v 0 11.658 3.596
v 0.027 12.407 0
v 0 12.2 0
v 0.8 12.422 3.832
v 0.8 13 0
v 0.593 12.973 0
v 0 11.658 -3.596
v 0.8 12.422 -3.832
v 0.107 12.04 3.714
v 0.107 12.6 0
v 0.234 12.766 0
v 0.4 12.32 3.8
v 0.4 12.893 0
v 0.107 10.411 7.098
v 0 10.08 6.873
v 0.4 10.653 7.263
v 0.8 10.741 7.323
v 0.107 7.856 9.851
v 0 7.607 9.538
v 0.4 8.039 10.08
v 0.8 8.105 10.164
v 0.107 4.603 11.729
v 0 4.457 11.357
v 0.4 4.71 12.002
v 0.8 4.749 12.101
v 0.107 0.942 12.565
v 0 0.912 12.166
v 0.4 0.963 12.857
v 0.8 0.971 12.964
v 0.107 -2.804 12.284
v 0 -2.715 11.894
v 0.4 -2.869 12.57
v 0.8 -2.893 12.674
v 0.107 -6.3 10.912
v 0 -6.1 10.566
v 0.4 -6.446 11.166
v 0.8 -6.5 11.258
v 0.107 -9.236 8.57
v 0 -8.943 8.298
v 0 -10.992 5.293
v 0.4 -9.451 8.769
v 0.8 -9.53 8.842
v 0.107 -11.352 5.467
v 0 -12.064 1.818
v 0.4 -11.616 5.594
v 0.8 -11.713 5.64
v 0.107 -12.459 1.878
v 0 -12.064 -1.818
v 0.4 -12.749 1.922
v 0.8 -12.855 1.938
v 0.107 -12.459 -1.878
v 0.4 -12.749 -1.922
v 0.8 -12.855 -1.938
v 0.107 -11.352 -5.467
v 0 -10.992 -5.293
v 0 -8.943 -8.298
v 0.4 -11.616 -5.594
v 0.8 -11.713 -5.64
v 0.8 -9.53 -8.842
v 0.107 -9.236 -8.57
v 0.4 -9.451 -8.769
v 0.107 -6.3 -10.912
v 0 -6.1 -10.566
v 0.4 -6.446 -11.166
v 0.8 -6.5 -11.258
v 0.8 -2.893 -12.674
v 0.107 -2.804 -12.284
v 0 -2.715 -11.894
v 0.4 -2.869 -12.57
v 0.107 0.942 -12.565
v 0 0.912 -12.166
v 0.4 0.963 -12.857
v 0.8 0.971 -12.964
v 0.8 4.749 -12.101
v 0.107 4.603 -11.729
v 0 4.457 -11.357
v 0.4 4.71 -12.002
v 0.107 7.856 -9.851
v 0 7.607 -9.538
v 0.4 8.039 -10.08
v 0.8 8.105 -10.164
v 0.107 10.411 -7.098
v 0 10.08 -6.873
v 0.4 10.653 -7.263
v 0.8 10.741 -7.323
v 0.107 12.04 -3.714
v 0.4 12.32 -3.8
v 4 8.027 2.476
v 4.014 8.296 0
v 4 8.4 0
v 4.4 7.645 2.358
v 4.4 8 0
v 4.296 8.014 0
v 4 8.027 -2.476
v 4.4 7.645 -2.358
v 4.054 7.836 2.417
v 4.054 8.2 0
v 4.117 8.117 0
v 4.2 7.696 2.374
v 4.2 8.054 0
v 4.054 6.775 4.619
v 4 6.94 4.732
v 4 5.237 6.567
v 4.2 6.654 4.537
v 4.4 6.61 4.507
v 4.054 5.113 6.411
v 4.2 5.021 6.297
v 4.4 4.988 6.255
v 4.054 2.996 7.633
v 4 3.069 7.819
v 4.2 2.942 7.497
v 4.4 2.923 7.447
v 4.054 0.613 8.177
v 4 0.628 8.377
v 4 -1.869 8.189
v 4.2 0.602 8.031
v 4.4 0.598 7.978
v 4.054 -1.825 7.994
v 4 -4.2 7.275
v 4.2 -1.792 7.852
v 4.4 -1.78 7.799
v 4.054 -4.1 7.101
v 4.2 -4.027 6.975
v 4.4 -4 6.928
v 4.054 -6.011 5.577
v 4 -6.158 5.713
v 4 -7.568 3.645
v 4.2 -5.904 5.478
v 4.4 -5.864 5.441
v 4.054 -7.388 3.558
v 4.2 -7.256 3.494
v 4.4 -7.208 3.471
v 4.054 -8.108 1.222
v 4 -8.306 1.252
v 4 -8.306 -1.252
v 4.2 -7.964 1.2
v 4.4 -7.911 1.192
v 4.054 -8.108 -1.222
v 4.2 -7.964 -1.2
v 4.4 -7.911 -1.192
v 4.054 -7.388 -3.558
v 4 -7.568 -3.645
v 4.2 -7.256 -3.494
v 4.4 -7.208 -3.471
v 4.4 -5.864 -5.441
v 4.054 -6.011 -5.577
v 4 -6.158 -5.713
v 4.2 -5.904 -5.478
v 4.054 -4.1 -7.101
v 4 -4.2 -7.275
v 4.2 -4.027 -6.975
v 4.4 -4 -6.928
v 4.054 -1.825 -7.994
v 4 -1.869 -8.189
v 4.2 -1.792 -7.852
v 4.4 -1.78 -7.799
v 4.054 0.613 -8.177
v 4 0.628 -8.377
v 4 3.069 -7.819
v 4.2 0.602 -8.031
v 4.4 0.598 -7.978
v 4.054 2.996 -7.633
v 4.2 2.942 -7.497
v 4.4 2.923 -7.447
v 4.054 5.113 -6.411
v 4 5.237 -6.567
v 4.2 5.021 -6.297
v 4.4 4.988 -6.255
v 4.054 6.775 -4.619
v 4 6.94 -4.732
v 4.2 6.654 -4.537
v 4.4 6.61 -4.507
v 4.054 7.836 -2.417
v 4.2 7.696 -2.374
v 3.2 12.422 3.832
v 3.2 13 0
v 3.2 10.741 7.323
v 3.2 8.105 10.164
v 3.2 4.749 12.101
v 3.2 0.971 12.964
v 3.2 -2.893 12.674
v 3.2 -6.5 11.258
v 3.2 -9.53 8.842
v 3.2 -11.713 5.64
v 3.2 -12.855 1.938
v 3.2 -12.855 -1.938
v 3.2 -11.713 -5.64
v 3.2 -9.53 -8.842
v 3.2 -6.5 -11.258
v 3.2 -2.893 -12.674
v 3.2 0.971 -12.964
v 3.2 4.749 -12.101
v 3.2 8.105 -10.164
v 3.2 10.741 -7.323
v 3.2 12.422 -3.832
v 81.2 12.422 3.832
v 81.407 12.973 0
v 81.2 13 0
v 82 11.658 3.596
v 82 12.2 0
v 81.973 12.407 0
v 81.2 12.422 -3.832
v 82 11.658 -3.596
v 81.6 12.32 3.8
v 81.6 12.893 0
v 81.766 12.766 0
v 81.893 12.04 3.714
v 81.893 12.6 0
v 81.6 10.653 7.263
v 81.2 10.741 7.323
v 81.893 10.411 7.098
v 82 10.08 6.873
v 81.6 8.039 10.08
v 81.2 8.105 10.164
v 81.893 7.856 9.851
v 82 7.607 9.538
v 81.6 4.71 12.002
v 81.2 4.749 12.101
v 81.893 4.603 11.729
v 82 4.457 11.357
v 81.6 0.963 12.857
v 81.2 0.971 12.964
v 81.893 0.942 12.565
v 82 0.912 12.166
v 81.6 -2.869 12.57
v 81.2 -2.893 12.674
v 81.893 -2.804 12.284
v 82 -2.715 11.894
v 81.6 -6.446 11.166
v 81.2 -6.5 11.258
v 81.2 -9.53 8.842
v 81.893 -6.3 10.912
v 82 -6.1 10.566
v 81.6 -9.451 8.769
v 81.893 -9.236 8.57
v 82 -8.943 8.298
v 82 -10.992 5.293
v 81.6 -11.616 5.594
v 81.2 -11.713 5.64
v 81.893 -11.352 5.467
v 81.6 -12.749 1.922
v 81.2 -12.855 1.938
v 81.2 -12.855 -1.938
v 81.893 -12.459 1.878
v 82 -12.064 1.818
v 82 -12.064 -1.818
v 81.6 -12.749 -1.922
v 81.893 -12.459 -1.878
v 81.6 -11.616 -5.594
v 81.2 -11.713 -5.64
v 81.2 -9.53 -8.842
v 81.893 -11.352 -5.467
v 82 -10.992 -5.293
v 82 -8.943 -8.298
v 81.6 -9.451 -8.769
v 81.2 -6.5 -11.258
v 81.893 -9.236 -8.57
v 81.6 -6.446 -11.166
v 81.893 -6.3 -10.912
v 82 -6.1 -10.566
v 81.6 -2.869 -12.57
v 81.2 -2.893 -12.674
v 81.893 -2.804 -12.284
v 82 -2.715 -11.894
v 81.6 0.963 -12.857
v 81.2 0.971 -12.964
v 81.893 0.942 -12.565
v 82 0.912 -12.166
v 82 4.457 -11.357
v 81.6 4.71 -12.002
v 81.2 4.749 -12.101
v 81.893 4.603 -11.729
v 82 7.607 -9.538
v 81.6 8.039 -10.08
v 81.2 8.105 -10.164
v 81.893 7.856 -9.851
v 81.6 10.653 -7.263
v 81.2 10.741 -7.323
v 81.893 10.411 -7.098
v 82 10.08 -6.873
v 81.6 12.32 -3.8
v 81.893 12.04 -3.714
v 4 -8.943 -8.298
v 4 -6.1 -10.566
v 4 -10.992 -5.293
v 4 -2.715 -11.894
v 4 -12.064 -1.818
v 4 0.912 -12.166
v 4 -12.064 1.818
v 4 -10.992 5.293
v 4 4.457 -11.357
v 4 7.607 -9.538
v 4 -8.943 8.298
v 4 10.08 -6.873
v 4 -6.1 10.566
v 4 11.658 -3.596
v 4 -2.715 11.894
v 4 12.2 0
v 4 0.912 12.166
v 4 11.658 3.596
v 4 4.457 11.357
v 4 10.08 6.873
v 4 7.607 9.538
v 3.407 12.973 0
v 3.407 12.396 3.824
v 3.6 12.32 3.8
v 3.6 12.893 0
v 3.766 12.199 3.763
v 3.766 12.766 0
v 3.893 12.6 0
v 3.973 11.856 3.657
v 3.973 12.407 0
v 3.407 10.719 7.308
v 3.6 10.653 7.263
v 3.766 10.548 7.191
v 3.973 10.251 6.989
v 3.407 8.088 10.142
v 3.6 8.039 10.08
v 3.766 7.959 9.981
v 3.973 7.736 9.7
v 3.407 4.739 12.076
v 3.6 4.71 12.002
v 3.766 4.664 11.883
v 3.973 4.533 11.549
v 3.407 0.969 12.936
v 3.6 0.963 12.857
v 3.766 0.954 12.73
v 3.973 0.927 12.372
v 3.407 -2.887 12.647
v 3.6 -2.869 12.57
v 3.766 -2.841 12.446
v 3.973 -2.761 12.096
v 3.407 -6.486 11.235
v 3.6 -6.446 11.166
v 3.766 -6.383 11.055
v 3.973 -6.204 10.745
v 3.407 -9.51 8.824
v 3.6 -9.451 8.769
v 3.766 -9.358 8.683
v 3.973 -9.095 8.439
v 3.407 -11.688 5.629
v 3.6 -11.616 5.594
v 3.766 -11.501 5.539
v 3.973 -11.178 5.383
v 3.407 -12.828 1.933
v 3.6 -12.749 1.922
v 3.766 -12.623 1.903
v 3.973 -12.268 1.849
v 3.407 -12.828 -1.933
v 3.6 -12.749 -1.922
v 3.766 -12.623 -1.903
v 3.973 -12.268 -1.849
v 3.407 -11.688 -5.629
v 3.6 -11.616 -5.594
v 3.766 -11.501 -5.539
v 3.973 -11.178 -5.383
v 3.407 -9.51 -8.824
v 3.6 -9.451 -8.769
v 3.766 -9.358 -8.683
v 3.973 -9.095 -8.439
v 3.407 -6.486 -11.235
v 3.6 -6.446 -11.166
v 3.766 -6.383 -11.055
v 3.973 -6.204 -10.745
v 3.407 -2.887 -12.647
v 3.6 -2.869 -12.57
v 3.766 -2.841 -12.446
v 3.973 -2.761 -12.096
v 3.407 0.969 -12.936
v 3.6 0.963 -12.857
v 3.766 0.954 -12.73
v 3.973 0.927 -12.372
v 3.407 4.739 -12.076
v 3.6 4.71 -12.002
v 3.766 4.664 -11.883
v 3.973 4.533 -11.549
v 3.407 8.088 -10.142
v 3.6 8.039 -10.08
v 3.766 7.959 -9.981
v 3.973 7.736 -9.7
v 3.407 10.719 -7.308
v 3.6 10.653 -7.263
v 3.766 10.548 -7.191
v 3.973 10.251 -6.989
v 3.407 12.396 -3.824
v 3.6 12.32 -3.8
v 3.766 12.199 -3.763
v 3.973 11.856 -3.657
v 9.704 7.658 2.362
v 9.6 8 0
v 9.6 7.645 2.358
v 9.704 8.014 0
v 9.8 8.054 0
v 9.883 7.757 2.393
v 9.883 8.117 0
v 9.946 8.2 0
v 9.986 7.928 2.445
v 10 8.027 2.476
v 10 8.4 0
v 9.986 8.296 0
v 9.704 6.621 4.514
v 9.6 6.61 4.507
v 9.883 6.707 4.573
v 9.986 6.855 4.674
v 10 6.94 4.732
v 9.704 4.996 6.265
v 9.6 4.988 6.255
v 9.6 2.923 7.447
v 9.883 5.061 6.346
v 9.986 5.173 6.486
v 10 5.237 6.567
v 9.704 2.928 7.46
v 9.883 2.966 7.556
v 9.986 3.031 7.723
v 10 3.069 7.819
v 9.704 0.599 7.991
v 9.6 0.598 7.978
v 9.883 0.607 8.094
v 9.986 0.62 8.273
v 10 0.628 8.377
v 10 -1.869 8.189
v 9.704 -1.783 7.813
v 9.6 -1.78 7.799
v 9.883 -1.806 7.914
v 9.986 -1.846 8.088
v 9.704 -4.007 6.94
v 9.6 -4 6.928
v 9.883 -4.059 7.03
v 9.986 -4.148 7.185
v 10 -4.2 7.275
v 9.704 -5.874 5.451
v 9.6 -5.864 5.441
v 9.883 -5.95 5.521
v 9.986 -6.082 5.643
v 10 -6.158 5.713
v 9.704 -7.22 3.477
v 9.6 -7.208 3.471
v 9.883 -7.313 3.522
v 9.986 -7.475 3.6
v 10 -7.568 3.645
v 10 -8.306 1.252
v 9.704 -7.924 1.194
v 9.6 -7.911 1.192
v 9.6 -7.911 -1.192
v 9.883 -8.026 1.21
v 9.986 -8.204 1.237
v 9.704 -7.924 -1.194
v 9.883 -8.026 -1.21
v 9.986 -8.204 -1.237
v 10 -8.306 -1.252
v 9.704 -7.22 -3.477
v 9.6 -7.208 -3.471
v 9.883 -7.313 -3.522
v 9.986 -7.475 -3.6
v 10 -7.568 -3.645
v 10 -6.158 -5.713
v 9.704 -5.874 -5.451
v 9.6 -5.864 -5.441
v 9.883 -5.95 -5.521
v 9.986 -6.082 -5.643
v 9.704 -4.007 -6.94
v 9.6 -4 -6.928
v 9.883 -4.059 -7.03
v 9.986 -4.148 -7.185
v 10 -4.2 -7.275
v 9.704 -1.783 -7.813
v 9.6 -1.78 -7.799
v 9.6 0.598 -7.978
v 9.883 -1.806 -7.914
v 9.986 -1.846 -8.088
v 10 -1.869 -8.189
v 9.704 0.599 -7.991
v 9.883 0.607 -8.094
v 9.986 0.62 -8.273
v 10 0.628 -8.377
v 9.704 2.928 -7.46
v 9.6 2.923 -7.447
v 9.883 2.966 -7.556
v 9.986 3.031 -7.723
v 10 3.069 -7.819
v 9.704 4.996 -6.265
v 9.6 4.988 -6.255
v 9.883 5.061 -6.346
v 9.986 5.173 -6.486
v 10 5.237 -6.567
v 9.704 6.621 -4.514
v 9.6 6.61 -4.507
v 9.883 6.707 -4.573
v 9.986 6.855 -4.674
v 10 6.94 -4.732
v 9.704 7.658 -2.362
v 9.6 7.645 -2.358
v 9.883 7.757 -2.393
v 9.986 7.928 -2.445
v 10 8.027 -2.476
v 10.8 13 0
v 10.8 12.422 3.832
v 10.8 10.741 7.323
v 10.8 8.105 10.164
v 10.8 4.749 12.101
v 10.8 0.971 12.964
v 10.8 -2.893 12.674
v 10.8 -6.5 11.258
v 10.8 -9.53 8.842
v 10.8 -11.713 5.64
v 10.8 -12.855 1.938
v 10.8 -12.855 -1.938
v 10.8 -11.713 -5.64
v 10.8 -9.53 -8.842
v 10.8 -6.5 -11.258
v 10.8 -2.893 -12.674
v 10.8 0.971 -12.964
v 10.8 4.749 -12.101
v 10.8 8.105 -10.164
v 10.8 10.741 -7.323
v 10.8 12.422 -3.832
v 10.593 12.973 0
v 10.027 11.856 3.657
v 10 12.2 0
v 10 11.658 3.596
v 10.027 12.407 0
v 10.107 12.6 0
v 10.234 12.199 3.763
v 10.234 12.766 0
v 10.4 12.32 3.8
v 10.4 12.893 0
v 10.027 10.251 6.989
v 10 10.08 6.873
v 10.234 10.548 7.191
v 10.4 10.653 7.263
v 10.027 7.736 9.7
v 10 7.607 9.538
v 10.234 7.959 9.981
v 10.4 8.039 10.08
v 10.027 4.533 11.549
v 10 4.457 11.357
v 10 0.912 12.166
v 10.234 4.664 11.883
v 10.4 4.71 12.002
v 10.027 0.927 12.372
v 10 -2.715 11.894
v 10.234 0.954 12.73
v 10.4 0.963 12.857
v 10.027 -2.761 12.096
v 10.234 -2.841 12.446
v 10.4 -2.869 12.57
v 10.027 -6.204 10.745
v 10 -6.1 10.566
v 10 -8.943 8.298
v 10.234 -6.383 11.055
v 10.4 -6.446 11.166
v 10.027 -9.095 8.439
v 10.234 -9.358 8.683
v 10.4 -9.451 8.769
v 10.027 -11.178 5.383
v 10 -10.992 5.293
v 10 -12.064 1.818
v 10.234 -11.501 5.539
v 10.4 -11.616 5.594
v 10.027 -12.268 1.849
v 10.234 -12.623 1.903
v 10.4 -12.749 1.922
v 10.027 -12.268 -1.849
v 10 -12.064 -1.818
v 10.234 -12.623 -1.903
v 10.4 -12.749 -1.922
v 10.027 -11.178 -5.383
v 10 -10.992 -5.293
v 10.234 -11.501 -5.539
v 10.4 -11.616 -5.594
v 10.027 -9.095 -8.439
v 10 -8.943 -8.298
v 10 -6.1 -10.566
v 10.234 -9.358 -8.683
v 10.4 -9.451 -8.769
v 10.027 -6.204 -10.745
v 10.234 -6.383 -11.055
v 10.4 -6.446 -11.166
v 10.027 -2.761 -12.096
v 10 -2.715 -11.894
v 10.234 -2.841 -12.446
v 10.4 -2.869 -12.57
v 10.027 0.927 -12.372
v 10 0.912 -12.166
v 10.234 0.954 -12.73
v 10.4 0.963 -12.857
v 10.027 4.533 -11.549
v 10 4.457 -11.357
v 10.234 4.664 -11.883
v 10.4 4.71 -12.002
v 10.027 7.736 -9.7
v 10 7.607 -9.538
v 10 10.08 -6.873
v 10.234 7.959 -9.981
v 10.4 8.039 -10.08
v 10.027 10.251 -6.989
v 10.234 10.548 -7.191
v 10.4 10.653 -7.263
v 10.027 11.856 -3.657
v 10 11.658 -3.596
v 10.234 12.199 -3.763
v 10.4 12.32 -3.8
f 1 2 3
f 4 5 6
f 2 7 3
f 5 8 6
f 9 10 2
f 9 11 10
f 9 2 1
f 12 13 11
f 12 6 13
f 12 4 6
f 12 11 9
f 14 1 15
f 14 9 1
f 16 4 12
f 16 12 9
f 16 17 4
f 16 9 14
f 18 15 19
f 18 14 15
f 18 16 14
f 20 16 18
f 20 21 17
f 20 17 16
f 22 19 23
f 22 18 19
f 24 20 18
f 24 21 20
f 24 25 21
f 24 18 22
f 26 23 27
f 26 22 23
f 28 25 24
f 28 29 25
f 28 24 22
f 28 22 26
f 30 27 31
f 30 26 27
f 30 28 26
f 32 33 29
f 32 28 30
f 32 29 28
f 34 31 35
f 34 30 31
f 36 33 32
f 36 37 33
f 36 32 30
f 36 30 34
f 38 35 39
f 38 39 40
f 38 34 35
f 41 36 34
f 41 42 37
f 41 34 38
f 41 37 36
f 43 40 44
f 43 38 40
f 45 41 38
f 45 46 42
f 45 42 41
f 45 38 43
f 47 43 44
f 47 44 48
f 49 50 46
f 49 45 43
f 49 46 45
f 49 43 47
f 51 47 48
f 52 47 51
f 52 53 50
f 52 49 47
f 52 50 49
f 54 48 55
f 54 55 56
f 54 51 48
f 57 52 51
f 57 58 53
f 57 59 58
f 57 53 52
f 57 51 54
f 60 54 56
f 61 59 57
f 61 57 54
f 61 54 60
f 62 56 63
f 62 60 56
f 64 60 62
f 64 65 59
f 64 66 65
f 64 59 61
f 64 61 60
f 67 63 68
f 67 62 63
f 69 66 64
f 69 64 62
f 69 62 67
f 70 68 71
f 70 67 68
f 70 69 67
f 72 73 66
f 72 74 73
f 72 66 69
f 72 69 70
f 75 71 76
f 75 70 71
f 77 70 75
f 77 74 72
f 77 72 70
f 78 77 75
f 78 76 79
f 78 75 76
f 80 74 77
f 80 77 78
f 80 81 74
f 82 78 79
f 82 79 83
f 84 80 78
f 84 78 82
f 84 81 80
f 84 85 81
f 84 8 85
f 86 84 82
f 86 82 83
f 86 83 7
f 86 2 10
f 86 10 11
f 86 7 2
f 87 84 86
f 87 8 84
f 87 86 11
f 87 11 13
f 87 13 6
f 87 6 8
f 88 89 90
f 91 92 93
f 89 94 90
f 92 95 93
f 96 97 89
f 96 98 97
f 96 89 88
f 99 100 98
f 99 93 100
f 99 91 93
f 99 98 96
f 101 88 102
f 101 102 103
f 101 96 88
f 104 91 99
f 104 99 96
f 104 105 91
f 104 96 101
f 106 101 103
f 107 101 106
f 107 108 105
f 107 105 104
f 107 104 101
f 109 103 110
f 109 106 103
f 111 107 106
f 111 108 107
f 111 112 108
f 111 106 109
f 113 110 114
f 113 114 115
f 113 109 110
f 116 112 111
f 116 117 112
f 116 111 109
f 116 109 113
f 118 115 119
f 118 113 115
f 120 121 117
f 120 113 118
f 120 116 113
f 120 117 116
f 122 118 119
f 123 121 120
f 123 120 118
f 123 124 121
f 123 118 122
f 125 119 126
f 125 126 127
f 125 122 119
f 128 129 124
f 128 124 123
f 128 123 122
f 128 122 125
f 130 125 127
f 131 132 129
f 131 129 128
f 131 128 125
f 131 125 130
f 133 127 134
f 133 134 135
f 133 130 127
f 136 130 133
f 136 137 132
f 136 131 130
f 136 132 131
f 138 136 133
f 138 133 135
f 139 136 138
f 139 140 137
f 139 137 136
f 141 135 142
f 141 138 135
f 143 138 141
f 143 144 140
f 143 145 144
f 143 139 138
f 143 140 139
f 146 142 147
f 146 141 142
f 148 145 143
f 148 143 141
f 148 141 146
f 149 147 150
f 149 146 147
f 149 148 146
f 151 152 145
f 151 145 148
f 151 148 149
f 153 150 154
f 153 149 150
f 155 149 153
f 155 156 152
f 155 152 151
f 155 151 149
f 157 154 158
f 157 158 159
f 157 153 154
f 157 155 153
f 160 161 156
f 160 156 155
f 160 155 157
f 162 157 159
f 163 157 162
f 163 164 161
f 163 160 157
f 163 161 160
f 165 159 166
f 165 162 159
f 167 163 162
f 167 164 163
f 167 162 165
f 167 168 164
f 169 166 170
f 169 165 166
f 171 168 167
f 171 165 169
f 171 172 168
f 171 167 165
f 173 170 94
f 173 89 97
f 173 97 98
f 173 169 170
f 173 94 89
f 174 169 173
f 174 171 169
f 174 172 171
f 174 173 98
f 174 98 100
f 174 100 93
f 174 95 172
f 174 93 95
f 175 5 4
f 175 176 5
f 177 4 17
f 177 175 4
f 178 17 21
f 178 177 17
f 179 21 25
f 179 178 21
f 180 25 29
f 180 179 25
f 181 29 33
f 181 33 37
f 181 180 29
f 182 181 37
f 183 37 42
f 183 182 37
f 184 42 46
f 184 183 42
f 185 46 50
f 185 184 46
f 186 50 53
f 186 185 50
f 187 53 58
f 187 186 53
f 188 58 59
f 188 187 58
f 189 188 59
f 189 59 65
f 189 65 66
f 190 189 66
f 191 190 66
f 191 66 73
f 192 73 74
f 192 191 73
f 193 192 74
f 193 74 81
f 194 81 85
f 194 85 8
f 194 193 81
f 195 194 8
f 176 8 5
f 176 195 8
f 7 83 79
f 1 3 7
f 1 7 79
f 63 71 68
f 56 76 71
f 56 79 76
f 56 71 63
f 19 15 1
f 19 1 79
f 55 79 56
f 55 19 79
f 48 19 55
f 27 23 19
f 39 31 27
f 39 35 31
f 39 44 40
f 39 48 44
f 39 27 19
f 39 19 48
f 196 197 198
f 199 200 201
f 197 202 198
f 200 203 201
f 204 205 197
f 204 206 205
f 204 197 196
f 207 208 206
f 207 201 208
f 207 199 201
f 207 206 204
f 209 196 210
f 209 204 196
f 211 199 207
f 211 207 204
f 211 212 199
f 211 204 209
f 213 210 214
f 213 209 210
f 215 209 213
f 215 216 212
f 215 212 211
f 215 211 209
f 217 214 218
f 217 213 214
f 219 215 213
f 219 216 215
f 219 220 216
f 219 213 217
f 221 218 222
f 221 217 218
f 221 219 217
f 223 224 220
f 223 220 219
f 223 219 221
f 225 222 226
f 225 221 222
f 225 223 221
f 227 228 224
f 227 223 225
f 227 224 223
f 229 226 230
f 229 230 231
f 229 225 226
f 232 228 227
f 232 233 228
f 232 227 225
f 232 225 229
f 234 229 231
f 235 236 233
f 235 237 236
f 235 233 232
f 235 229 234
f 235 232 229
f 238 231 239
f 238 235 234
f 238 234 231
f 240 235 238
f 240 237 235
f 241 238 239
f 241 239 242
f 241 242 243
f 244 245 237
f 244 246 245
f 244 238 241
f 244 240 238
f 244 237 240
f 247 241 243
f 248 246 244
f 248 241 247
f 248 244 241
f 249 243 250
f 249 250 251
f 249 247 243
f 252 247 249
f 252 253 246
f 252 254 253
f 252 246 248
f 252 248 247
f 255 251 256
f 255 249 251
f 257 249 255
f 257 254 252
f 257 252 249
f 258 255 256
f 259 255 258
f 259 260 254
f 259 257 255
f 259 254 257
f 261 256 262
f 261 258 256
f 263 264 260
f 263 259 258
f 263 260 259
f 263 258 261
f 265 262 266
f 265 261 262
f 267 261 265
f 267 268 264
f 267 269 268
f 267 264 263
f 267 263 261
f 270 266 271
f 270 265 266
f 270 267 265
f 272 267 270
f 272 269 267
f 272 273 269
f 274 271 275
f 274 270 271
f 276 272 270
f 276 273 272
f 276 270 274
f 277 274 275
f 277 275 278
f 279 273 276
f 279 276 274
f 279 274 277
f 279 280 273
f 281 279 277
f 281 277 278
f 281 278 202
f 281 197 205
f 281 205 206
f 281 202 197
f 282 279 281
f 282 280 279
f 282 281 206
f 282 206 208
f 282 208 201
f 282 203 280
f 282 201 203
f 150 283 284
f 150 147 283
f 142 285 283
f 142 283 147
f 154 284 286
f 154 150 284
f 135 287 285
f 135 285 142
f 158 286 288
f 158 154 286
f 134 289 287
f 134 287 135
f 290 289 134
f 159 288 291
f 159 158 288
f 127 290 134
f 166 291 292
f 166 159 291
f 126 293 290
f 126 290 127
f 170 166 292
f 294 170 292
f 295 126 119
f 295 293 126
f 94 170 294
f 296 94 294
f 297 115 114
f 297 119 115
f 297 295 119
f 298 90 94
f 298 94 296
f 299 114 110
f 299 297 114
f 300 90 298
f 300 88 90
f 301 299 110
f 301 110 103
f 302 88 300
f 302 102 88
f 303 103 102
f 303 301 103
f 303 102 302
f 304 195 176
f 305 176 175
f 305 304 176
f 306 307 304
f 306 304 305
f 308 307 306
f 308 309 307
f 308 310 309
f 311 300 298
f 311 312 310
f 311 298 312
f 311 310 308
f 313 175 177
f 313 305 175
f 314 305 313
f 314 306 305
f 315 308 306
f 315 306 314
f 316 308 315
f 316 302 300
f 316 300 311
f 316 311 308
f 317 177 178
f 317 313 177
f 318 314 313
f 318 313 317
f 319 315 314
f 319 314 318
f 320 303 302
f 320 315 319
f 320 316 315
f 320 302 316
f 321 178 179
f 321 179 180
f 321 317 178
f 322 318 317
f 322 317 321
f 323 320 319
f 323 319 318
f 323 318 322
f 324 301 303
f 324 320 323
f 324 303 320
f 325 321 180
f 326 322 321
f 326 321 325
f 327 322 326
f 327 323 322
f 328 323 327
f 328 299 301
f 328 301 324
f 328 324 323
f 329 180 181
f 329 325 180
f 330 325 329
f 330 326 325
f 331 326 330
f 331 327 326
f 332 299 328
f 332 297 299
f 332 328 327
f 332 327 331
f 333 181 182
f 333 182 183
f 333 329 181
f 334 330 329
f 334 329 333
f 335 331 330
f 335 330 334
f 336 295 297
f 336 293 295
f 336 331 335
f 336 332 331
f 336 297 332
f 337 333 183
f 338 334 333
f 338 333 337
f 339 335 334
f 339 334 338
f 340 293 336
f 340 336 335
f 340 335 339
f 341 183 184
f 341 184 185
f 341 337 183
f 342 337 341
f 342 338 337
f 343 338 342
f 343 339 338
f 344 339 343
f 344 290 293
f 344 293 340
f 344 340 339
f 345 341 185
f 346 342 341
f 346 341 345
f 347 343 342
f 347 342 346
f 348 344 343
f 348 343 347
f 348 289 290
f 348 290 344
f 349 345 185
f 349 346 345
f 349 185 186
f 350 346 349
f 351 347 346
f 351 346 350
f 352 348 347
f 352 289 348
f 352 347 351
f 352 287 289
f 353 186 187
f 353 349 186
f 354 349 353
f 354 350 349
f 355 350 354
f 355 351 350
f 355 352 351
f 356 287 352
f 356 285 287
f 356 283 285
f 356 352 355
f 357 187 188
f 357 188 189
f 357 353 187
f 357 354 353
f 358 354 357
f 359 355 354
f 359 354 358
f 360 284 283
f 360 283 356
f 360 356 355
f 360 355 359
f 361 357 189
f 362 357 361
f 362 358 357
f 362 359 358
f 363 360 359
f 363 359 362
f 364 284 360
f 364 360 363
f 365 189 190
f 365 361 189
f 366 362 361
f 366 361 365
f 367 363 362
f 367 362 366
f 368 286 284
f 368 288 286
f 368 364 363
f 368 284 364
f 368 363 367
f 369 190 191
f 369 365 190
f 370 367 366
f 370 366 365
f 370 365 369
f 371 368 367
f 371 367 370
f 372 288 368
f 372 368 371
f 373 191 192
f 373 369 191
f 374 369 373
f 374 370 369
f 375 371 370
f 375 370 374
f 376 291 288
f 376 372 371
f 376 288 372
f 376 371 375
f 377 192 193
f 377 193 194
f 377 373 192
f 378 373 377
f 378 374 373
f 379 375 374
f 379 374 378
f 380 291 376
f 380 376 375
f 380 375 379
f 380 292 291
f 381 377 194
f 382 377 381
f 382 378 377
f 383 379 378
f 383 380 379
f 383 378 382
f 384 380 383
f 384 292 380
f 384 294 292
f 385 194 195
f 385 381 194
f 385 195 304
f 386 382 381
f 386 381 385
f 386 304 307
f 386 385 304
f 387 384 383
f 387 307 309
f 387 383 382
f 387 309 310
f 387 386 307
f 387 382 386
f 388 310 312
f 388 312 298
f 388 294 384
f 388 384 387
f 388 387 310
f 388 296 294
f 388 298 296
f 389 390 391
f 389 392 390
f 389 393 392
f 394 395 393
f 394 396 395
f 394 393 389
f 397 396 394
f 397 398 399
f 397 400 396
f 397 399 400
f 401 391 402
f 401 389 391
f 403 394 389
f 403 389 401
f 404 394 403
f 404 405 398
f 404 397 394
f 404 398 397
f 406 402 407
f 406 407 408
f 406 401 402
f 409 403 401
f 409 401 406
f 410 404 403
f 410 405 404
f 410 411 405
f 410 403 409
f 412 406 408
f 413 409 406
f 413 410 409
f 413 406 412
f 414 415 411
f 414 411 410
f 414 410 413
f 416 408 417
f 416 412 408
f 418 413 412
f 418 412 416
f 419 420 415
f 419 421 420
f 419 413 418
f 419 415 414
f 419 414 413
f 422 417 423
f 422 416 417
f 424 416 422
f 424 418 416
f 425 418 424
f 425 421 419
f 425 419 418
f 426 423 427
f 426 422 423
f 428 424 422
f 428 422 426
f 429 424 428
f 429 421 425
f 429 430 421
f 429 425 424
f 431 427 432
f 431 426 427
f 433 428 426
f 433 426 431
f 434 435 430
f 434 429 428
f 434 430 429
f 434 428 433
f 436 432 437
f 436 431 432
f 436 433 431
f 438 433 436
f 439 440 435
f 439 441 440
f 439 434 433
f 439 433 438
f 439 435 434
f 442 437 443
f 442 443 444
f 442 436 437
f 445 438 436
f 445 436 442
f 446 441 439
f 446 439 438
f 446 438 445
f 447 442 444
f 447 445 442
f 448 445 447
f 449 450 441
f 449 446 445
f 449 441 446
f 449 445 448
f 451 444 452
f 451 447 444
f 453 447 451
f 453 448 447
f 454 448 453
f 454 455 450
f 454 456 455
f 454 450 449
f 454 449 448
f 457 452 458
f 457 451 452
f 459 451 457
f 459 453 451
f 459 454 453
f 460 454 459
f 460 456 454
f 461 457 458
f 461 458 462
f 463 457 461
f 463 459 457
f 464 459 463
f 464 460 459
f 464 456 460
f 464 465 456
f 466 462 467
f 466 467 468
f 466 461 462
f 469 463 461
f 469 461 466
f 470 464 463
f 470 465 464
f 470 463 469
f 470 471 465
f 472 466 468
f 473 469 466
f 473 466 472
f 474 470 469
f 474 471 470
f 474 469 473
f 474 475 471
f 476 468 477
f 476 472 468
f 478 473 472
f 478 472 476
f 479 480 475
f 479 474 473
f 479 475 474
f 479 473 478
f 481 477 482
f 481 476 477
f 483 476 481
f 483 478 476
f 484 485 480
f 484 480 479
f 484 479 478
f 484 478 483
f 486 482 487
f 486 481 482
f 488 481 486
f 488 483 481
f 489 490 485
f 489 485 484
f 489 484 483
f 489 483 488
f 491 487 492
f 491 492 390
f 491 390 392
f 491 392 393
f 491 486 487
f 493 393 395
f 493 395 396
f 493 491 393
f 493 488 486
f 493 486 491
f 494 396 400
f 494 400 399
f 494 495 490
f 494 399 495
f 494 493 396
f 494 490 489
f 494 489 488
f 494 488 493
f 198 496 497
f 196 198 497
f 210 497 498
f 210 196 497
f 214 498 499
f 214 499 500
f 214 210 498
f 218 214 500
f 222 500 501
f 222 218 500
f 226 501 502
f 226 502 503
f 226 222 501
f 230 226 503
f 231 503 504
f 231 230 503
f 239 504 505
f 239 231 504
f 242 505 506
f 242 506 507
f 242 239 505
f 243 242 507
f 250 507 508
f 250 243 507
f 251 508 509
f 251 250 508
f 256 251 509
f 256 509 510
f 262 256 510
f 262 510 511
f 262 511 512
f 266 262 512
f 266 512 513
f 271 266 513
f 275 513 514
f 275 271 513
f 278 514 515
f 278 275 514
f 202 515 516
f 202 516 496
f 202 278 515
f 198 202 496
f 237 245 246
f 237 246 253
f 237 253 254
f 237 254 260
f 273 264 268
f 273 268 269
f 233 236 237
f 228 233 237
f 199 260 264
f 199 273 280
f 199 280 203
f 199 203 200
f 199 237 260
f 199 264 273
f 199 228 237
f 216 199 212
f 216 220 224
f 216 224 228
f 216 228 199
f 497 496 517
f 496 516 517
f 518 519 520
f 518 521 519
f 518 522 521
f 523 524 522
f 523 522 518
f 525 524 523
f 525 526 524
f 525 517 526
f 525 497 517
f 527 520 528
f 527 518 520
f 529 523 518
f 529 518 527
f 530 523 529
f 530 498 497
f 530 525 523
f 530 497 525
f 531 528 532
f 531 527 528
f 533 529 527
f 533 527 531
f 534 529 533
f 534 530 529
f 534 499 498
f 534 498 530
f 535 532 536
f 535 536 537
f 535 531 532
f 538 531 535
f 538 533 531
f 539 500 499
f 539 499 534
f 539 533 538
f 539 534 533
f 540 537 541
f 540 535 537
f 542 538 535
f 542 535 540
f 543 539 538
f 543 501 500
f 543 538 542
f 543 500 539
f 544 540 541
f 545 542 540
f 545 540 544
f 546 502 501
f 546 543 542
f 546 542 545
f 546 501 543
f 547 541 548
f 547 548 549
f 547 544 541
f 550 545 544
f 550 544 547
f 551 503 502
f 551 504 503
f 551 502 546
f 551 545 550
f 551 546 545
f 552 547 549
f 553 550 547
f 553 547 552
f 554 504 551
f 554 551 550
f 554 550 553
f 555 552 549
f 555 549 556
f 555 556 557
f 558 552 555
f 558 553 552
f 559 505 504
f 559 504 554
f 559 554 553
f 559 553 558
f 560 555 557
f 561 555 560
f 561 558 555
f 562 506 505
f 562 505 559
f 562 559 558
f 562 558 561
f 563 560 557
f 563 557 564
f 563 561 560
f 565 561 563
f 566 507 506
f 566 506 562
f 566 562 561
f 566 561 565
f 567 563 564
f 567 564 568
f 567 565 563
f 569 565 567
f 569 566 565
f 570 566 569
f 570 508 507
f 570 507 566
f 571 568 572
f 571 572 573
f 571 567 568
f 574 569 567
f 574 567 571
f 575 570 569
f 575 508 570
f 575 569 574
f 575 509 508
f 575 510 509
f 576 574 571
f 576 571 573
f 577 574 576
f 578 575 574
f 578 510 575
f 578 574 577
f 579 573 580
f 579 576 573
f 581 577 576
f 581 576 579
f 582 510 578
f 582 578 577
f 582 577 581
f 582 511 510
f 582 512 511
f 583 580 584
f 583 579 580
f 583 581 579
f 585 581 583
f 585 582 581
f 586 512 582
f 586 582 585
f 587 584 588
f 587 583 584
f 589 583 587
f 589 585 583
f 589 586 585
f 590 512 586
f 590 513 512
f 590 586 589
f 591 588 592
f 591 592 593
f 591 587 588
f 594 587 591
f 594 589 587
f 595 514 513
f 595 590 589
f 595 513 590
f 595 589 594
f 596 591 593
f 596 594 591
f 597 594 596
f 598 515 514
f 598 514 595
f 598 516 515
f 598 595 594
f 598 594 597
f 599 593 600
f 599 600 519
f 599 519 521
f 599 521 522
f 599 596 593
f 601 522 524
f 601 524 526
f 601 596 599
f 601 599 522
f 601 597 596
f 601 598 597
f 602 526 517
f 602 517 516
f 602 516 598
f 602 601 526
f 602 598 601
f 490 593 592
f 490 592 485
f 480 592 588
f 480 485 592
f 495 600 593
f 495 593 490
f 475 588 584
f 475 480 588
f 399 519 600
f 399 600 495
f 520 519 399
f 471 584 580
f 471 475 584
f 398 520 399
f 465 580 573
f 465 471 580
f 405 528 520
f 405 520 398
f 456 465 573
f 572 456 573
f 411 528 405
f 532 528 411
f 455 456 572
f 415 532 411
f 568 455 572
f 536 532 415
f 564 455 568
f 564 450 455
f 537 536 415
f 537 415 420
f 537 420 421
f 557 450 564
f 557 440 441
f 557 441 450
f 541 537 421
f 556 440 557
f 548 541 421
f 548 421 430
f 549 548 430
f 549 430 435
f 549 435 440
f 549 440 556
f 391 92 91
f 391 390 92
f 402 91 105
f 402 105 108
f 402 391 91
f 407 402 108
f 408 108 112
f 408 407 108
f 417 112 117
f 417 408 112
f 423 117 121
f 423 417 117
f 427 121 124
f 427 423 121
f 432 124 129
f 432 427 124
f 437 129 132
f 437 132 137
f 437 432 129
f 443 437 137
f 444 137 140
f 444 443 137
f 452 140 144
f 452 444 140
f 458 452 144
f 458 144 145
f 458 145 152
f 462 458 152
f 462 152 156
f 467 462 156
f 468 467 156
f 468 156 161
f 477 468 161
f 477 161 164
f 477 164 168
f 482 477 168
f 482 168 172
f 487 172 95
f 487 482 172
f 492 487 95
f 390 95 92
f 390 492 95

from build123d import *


with BuildPart() as part:
    # Sketch1 → Base-Revolve (revolve)
    with BuildSketch(Plane.XY):
        with BuildLine():
            Line((0, 0), (0, 12.2))
            ThreePointArc((0, 12.2), (0.234314575, 12.765685425), (0.8, 13))
            Line((0.8, 13), (3.2, 13))
            ThreePointArc((3.2, 13), (3.765685425, 12.765685425), (4, 12.2))
            Line((4, 12.2), (4, 8.4))
            ThreePointArc((4, 8.4), (4.117157288, 8.117157288), (4.4, 8))
            Line((4.4, 8), (9.6, 8))
            ThreePointArc((9.6, 8), (9.882842712, 8.117157288), (10, 8.4))
            Line((10, 8.4), (10, 12.2))
            ThreePointArc((10, 12.2), (10.234314575, 12.765685425), (10.8, 13))
            Line((10.8, 13), (81.2, 13))
            ThreePointArc((81.2, 13), (81.765685425, 12.765685425), (82, 12.2))
            Line((82, 12.2), (82, 0))
            Line((82, 0), (0, 0))
        make_face()
    revolve(axis=Axis((0, 0, 0), (1, 0, 0)))


solid = part.part
